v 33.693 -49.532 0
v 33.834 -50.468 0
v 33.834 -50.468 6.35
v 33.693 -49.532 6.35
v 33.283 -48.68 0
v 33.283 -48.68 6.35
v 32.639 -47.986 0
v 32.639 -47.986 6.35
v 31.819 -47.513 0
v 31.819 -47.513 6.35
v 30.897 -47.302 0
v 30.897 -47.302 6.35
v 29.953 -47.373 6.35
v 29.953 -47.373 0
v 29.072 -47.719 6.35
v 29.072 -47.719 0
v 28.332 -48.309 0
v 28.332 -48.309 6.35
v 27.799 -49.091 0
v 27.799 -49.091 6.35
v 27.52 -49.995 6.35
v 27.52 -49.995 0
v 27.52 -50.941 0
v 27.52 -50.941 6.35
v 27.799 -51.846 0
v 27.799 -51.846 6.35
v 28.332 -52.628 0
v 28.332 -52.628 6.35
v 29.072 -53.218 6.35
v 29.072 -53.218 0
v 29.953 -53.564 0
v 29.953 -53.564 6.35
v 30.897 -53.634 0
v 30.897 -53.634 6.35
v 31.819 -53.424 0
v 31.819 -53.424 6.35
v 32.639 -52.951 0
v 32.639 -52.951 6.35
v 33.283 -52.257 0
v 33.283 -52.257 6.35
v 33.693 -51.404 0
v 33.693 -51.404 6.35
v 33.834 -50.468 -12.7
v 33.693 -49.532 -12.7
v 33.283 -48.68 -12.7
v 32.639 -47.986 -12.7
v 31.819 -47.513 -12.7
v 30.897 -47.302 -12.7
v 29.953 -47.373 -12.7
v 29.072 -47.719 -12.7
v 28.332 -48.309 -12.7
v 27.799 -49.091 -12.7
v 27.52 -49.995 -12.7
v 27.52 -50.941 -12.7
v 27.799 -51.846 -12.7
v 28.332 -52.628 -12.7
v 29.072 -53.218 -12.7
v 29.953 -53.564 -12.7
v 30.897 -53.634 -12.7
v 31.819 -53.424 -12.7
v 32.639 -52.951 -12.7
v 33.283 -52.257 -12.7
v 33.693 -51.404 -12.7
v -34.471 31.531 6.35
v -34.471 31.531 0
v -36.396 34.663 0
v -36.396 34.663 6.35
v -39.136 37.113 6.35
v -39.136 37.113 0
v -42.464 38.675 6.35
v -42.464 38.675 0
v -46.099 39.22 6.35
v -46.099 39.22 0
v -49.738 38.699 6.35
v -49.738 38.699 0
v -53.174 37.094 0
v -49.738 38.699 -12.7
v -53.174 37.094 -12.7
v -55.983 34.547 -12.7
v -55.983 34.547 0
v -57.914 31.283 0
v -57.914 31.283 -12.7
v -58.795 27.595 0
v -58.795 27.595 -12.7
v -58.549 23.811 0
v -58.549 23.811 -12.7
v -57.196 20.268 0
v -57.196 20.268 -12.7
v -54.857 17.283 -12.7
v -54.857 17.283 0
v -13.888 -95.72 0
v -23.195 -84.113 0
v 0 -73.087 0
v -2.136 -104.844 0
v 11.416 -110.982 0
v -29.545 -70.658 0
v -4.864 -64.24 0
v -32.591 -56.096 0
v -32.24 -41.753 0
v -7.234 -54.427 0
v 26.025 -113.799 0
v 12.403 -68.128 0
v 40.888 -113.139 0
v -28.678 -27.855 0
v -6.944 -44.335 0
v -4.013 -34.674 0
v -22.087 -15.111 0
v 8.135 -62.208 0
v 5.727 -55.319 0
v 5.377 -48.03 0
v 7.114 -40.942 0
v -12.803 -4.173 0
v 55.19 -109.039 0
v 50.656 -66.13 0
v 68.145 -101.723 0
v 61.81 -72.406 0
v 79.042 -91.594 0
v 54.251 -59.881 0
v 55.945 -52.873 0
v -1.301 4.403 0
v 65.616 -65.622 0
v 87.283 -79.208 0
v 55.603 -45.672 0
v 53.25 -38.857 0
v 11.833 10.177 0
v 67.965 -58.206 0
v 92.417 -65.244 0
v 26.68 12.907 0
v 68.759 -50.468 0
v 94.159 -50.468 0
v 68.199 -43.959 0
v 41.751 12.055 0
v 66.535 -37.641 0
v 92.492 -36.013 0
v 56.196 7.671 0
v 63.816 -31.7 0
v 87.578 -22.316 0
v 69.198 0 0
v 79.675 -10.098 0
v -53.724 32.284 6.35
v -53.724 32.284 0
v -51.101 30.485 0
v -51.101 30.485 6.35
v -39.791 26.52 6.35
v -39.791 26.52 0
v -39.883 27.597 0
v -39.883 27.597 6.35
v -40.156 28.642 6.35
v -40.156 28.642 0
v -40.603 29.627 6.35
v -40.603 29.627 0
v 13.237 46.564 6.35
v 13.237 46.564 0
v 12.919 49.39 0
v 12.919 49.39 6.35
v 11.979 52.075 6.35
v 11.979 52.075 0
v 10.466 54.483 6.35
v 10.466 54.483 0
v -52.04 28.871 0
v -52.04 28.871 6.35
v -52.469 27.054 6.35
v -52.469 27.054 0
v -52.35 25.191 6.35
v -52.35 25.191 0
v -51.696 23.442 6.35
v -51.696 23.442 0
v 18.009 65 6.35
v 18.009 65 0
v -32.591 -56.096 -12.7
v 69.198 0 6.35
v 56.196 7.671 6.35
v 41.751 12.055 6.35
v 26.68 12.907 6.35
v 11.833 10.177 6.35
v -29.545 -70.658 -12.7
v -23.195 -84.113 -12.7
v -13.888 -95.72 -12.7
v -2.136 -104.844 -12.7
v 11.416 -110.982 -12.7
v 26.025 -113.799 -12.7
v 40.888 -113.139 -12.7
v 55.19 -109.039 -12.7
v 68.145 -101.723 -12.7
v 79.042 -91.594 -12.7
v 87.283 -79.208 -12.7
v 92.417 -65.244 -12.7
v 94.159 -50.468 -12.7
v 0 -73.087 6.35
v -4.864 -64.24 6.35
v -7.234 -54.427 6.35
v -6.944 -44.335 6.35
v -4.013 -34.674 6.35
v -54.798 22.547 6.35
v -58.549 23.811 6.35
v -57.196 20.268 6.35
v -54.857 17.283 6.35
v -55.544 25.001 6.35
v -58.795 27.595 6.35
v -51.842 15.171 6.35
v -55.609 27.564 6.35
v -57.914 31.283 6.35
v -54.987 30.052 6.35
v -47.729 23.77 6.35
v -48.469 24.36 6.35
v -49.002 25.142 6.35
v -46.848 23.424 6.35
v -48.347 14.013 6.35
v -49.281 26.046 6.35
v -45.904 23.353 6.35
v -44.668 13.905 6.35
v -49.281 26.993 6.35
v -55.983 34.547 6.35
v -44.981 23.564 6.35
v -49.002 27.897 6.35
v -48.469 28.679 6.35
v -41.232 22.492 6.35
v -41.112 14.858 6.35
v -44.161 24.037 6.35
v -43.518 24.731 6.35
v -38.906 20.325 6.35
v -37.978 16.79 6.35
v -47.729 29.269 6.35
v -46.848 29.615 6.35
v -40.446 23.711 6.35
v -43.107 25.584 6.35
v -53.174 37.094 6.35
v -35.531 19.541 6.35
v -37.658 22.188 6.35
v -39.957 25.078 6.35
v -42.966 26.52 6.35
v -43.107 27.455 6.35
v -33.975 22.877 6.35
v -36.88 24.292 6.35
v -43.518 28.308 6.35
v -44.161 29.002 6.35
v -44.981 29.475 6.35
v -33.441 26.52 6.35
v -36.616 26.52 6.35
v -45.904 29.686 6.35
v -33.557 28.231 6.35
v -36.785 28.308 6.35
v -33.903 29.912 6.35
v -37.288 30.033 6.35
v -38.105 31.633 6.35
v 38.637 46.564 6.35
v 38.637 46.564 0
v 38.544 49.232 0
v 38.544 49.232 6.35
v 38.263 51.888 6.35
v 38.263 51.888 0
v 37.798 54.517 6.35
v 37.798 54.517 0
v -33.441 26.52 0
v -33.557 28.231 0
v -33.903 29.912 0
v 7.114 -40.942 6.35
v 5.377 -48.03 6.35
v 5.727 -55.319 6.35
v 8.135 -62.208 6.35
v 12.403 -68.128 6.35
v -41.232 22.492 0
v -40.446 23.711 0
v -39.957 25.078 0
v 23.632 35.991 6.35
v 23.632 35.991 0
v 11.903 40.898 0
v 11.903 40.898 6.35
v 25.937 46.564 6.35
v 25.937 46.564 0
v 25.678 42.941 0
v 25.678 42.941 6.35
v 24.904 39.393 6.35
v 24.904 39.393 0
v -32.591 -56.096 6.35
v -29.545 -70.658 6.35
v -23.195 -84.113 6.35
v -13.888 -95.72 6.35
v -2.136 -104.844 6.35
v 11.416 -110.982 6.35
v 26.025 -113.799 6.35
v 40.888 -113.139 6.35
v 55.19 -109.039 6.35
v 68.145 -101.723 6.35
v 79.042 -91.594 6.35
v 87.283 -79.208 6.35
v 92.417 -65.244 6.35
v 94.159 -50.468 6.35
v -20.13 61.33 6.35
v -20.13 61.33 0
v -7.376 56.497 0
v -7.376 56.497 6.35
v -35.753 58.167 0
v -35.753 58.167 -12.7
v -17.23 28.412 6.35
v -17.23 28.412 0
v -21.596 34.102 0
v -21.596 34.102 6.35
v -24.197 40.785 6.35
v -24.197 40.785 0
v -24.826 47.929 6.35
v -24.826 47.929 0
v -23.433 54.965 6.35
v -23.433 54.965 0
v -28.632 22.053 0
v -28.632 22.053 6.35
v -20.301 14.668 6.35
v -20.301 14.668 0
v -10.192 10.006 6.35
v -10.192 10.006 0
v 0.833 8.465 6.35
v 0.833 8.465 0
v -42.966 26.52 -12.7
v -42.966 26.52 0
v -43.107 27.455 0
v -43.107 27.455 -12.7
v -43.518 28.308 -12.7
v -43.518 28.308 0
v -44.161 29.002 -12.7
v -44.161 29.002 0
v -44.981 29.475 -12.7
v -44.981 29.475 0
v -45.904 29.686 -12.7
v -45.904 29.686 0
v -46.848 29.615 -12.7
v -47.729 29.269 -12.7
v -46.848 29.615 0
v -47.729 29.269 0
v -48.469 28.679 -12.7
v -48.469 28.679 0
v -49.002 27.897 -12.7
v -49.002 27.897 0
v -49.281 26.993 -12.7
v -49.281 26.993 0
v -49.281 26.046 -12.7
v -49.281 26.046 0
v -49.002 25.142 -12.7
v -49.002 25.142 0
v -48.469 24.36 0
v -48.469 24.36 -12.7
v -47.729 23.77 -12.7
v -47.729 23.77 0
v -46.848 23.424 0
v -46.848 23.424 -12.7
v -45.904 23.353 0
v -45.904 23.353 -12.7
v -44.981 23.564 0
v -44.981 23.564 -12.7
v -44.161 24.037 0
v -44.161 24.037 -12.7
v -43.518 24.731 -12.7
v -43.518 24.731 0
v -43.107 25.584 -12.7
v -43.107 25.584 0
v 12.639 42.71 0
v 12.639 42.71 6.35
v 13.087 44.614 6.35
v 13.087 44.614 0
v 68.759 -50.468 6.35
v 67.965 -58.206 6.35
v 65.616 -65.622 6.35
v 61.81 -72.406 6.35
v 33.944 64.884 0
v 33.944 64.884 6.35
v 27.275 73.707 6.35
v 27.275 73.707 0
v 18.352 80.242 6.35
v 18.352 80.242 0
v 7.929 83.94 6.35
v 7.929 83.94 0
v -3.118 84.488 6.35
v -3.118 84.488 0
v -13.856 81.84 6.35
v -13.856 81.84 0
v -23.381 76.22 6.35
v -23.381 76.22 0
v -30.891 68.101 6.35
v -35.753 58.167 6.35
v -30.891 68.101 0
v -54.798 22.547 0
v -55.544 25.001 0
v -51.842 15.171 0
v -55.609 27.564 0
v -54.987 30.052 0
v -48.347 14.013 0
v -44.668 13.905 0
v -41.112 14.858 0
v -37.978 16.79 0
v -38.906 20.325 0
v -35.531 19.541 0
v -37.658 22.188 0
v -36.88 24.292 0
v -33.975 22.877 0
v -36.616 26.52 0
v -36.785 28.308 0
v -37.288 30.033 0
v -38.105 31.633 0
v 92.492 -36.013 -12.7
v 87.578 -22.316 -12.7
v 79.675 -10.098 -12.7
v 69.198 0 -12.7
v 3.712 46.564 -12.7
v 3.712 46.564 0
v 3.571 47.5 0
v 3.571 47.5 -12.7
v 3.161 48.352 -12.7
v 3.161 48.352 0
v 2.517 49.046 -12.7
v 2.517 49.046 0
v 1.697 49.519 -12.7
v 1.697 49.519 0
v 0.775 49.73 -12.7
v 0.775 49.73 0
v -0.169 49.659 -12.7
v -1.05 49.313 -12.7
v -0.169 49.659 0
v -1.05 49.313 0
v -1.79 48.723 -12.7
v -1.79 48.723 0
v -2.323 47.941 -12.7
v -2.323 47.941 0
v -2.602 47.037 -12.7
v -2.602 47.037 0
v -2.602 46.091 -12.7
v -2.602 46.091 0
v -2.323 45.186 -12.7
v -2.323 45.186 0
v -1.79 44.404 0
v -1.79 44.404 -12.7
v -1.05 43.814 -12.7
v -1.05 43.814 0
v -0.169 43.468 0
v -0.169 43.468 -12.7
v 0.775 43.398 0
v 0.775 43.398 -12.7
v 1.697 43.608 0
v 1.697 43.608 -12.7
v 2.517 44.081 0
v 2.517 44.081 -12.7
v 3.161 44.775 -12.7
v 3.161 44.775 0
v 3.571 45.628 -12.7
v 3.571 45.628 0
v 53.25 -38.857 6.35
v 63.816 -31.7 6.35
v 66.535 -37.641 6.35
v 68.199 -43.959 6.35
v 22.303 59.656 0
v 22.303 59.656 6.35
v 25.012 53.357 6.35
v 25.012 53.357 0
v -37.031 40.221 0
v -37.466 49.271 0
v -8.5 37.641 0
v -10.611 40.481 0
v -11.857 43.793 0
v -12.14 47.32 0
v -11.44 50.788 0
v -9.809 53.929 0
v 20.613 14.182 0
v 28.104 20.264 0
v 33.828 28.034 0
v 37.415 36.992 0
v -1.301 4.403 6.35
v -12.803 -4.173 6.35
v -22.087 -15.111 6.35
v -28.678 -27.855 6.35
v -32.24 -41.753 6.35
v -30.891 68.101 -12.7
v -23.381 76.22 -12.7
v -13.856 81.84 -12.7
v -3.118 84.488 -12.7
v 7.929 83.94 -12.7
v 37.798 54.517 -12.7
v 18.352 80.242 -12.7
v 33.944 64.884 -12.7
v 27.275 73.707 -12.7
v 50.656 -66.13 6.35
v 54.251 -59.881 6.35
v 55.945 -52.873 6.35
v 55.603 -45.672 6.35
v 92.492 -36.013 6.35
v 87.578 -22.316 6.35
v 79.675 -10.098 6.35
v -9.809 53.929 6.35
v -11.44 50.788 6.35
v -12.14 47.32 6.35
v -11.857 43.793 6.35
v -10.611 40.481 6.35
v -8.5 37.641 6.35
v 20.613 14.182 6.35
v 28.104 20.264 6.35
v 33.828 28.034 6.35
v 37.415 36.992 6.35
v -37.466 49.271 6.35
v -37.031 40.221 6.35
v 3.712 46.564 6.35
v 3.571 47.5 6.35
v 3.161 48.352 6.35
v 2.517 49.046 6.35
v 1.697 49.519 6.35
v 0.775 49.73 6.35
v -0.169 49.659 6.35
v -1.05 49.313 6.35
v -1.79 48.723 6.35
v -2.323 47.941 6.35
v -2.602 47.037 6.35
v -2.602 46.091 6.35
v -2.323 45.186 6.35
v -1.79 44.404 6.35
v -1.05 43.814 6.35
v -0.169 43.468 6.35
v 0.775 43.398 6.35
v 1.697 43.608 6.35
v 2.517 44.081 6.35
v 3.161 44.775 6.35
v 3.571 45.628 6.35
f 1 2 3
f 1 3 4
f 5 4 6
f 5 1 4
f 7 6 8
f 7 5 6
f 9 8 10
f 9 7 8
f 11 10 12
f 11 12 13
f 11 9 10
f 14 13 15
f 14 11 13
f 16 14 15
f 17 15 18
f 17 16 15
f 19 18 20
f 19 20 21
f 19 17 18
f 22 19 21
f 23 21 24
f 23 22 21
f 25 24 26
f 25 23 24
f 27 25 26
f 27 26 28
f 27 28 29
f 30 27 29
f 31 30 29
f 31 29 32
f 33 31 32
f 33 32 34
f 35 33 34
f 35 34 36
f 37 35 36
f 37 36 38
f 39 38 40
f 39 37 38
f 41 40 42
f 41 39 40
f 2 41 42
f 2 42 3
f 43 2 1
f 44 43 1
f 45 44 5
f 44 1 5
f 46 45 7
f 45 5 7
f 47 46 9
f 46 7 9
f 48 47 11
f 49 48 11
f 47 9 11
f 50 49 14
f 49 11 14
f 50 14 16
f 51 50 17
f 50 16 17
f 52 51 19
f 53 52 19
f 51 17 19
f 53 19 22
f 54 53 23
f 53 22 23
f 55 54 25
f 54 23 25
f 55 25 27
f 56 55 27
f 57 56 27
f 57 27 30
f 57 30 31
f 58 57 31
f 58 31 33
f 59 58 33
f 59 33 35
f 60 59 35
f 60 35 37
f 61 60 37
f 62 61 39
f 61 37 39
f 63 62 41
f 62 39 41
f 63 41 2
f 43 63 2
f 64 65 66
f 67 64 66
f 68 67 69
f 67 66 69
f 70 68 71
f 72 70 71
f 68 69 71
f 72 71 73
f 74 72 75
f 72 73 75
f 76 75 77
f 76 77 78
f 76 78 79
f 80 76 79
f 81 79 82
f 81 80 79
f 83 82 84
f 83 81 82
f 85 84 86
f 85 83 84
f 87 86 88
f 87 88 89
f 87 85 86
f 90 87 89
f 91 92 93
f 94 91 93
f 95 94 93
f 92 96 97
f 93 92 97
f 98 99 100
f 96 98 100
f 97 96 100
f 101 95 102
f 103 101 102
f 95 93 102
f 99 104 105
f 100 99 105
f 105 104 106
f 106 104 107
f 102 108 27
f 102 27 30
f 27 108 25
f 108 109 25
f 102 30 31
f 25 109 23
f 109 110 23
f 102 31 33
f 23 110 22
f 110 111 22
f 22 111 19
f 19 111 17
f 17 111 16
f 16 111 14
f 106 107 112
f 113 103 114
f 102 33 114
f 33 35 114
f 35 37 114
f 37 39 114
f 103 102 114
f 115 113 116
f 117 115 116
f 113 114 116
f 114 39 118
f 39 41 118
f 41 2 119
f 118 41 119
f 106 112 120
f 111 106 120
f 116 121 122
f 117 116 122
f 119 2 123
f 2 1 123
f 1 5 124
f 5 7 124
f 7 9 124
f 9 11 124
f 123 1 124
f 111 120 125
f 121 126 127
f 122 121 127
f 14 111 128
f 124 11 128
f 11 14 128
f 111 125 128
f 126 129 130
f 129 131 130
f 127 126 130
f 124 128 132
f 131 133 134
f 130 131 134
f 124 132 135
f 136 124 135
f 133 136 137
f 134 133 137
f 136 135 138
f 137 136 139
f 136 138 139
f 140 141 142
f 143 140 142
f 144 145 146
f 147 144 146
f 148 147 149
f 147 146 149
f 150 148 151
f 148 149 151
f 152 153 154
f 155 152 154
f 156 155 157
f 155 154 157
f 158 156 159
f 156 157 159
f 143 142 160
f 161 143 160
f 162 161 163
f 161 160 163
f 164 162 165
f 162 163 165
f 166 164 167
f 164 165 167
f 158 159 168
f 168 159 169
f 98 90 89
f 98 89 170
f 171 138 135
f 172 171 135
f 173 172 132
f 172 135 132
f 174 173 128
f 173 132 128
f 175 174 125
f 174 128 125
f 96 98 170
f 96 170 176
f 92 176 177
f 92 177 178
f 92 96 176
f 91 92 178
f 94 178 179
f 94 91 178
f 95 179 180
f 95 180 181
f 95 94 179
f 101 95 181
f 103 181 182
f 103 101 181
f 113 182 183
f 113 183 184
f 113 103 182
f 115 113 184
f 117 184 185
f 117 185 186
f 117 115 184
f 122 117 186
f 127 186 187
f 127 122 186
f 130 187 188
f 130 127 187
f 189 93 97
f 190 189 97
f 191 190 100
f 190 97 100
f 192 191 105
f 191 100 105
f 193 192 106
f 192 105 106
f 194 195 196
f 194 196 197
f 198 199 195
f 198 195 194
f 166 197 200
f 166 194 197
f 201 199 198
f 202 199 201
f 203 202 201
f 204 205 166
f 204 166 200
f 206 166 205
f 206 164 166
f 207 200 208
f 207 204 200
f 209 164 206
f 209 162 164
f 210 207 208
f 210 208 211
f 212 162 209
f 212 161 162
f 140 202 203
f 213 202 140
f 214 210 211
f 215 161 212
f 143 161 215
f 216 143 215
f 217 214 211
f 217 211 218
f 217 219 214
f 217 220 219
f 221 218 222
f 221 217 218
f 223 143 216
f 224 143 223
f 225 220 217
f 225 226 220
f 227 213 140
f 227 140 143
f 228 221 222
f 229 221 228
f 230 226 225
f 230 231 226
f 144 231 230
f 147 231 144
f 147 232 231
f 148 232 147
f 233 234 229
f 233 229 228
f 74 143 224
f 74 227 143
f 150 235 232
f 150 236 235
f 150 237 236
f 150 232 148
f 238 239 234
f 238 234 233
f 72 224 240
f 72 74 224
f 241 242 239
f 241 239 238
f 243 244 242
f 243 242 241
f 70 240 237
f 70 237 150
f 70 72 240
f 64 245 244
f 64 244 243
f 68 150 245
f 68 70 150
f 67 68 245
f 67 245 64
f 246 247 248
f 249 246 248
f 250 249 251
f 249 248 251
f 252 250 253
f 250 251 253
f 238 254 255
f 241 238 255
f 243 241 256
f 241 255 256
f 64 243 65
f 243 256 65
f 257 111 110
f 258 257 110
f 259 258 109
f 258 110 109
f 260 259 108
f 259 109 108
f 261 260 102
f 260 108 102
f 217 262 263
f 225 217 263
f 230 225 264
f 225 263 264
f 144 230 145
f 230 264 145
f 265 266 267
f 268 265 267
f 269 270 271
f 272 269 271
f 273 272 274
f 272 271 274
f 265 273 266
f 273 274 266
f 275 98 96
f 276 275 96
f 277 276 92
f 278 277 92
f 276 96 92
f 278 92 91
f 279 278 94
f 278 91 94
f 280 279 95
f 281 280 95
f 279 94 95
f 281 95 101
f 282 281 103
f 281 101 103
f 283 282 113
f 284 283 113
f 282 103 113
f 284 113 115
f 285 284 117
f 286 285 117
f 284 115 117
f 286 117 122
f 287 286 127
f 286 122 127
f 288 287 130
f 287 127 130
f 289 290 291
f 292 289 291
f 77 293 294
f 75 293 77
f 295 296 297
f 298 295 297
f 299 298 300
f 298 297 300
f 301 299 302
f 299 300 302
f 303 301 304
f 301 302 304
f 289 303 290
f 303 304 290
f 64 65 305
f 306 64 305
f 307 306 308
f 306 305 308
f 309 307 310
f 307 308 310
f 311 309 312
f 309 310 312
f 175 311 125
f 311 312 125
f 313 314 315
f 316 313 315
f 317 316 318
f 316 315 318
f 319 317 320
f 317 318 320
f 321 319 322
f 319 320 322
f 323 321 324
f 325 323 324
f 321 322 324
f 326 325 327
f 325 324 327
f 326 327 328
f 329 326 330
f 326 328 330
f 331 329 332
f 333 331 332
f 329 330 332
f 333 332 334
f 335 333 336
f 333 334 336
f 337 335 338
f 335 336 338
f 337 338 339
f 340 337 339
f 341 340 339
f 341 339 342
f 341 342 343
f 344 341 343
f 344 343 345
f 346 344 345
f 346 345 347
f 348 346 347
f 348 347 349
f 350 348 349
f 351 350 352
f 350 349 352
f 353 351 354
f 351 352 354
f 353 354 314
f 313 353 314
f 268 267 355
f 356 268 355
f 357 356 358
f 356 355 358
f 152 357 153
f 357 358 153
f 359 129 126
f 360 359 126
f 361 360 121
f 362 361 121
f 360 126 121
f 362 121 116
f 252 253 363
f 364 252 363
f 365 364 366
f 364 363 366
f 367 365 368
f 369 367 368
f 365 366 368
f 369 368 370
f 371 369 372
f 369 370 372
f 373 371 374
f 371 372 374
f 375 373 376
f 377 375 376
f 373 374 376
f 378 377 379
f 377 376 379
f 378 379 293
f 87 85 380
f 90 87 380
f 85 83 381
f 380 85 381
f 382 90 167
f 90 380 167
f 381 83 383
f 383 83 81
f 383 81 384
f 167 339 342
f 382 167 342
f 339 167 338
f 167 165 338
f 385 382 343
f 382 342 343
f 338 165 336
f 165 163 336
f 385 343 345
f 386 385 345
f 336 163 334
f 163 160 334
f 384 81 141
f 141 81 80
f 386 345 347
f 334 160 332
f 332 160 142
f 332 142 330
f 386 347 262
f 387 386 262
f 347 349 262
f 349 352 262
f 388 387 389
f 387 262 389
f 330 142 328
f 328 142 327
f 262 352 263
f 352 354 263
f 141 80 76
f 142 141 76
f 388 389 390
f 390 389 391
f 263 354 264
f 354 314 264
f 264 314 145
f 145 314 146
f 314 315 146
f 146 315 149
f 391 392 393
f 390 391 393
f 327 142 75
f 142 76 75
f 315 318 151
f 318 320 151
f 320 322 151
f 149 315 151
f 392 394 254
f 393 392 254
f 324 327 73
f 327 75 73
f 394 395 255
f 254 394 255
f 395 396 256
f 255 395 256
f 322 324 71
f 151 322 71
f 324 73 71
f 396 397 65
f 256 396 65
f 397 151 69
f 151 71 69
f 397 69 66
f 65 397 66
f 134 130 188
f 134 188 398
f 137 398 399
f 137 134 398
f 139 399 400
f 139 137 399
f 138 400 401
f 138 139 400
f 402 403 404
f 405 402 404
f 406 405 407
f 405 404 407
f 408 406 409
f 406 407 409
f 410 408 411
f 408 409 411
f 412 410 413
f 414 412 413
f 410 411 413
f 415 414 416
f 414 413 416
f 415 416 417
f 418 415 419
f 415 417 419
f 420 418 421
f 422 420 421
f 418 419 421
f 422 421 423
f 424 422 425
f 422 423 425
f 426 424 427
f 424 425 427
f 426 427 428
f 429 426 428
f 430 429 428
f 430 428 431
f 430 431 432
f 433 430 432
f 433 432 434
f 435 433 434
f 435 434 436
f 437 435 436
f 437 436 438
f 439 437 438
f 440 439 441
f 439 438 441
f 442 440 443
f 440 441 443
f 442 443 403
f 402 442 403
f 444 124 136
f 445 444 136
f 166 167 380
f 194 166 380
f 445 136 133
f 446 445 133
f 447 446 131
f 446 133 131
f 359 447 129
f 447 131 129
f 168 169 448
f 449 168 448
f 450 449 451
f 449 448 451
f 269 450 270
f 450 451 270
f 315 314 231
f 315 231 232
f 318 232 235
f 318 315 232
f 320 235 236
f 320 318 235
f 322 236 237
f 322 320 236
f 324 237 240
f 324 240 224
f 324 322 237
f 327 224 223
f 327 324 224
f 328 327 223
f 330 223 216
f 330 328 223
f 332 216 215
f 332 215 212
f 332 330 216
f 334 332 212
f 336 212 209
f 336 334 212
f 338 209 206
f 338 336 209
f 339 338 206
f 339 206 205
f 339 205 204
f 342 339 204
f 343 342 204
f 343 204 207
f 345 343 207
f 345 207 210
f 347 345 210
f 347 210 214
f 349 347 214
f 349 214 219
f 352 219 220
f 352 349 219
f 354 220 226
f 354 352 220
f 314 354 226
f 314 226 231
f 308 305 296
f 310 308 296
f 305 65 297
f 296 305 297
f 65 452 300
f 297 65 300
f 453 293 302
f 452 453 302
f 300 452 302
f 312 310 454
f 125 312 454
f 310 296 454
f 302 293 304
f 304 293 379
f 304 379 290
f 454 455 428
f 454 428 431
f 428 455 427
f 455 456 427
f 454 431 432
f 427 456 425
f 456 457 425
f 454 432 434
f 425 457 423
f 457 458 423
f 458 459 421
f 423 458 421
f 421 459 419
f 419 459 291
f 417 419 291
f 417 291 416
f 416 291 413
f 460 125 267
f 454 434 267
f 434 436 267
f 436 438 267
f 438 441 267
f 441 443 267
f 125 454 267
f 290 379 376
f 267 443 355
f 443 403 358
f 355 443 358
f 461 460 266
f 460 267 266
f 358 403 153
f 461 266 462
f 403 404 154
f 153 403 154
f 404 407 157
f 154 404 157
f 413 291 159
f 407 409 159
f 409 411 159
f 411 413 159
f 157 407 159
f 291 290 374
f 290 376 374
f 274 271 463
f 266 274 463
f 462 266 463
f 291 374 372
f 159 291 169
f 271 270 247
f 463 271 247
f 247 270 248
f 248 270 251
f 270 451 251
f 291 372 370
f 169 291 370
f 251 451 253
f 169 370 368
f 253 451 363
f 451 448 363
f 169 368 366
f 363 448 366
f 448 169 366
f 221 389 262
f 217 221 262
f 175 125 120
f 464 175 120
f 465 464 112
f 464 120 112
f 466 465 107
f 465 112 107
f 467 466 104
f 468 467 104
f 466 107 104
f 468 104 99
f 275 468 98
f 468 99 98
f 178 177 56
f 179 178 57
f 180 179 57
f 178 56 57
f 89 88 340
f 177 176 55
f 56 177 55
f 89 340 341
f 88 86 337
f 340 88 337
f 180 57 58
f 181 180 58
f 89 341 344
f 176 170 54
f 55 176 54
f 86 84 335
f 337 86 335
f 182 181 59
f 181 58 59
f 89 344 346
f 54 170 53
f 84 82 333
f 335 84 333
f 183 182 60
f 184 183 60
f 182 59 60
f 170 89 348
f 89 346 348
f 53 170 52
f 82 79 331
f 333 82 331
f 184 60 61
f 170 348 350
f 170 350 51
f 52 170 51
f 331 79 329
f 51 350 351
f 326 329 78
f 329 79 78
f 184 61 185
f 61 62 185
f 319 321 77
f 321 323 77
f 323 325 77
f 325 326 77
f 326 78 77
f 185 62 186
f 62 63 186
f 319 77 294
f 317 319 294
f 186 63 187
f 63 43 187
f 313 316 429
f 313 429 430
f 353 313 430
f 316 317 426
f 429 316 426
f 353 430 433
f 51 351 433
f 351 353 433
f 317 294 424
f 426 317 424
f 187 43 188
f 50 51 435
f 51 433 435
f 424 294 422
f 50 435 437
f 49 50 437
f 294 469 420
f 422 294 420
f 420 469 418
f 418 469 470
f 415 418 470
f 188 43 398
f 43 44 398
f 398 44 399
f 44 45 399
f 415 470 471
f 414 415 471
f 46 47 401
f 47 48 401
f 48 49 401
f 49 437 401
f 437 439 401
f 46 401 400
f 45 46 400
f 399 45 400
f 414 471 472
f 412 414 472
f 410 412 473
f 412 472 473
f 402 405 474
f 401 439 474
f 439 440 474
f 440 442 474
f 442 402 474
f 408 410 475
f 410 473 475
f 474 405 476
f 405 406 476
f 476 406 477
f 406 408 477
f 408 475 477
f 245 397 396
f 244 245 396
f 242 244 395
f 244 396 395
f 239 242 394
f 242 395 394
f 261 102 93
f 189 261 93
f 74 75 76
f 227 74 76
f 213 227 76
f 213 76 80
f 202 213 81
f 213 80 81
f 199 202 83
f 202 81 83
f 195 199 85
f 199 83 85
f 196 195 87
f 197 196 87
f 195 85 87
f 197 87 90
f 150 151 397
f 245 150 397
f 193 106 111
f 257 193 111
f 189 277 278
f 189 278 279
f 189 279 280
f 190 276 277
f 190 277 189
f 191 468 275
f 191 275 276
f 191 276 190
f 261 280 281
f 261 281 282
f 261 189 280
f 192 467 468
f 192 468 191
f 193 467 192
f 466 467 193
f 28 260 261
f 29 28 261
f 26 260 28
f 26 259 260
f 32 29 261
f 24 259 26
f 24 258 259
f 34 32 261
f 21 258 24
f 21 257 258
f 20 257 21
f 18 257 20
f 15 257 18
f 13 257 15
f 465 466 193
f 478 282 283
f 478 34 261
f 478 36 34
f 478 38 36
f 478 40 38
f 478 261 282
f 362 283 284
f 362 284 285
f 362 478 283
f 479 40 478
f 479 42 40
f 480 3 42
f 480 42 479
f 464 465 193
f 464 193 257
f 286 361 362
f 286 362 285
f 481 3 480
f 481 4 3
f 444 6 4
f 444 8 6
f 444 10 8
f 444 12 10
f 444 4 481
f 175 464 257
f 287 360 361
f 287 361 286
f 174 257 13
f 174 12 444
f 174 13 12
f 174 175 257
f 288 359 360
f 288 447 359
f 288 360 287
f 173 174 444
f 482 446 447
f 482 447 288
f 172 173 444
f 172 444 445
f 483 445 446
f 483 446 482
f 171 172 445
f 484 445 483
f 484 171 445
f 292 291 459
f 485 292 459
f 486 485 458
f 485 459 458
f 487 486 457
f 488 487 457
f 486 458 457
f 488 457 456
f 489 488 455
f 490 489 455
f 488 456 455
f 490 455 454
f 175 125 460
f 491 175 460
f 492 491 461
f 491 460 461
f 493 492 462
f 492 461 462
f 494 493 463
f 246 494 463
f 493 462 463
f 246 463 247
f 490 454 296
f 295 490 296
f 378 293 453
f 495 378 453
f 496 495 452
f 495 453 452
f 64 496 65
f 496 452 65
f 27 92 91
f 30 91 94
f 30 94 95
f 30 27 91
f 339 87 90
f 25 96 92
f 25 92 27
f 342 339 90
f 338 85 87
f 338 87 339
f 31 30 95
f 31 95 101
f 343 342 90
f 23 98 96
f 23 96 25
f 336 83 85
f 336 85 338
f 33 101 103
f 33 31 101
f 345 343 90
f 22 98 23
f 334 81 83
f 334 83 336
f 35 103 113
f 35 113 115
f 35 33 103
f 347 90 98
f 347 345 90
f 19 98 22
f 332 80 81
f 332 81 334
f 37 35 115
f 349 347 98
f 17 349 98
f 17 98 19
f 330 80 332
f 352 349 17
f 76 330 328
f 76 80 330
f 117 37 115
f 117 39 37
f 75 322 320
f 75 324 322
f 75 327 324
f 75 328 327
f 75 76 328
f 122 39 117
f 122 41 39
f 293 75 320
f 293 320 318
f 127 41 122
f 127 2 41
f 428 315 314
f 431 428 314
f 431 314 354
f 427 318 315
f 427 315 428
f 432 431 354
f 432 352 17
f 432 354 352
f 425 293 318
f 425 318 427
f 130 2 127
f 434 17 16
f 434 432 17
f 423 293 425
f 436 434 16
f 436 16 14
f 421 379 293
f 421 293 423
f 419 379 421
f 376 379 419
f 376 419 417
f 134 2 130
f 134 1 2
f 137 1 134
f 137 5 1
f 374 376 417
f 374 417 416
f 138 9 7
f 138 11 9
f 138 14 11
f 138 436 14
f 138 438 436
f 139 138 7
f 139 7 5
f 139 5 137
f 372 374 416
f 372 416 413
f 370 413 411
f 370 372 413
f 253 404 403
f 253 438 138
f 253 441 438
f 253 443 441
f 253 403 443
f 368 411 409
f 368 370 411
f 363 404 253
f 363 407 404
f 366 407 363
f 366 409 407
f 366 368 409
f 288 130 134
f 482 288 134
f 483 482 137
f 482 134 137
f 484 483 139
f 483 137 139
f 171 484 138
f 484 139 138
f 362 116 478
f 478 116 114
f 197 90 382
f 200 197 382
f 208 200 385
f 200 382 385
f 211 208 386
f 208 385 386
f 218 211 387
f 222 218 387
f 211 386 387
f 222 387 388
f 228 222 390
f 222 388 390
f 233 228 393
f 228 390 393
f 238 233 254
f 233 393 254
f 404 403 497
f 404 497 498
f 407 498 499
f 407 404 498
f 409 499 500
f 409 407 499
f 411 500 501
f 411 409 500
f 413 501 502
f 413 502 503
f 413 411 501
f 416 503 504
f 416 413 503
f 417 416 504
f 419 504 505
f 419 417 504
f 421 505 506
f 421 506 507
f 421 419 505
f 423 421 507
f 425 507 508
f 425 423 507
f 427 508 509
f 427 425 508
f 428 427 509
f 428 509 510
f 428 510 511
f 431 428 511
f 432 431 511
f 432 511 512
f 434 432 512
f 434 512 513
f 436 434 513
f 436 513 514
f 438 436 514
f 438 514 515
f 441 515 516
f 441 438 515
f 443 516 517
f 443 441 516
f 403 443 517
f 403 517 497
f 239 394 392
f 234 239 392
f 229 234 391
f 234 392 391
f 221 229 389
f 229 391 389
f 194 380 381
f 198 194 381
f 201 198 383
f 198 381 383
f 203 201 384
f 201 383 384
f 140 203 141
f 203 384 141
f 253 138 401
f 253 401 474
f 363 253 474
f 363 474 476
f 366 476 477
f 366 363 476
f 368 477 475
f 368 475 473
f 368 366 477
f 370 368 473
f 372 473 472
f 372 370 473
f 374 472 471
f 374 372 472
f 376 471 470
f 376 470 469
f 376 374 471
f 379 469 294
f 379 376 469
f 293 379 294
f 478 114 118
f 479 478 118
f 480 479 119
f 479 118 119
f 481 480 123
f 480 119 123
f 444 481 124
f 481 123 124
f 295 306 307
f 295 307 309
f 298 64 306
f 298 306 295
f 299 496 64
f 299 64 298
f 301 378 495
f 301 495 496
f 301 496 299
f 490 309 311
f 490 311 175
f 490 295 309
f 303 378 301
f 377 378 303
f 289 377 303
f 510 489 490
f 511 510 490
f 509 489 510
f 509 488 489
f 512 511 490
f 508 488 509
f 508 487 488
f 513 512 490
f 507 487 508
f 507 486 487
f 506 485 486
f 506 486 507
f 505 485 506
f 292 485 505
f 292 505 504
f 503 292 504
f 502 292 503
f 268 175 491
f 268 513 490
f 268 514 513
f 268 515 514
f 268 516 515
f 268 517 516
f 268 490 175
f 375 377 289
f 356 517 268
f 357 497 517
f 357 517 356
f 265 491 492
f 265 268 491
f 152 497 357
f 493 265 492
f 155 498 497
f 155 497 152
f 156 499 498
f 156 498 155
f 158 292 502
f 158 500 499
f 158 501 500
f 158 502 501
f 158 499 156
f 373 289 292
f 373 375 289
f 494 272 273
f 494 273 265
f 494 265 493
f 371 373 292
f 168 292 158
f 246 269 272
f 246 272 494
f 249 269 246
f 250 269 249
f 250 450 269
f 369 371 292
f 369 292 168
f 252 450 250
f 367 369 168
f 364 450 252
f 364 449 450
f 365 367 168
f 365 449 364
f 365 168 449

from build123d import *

# Parameters (mm, degrees)
F0_R     = 3.175
F1_DEPTH = 6.35
F2_DEPTH = 12.7


with BuildPart() as f1:
    # F0 (on Top) → F1 (new body)
    with BuildSketch(Plane.XY):
        with BuildLine():
            ThreePointArc((-35.7529609464, 58.1667364851), (-37.5186970008, 44.7329056435), (-34.4714793594, 31.5306293419))
            ThreePointArc((-34.4714793594, 31.5306293419), (-15.4180520019, 11.9655799049), (11.8330852799, 10.1767897043))
            ThreePointArc((11.8330852799, 10.1767897043), (31.2128455927, 23.9669025865), (38.6372855282, 46.5638053551))
            ThreePointArc((38.6372855282, 46.5638053551), (38.4268711154, 50.5624681355), (37.7979519832, 54.5169641821))
            ThreePointArc((37.7979519832, 54.5169641821), (2.4255752837, 84.6169834326), (-35.7529609464, 58.1667364851))
        make_face()
        with BuildLine():
            ThreePointArc((-20.1295190644, 61.3300908707), (-1.8957653213, 71.8470065678), (18.0089300704, 65.0002268351))
            ThreePointArc((18.0089300704, 65.0002268351), (23.8711640247, 56.5982517431), (25.9372855282, 46.5638053551))
            ThreePointArc((25.9372855282, 46.5638053551), (25.3543094725, 41.1531378778), (23.6321420204, 35.9908396591))
            ThreePointArc((23.6321420204, 35.9908396591), (5.1693034125, 21.589730591), (-17.2299057254, 28.4120309251))
            ThreePointArc((-17.2299057254, 28.4120309251), (-24.7647435766, 44.3350561147), (-20.1295190644, 61.3300908707))
        make_face(mode=Mode.SUBTRACT)
        with BuildLine():
            ThreePointArc((11.903429337, 40.8980507788), (12.8993247284, 43.6534811782), (13.2372855282, 46.5638053551))
            ThreePointArc((13.2372855282, 46.5638053551), (12.5244421894, 50.7588113362), (10.4659351059, 54.482891007))
            ThreePointArc((10.4659351059, 54.482891007), (1.962138395, 59.1836228778), (-7.3756989197, 56.4973181842))
            ThreePointArc((-7.3756989197, 56.4973181842), (-12.1401878613, 47.3198929538), (-8.5002807579, 37.6412274976))
            ThreePointArc((-8.5002807579, 37.6412274976), (2.5391078957, 34.022565097), (11.903429337, 40.8980507788))
        make_face()
        with Locations((0.5372855282, 46.5638053551)):
            Circle(F0_R, mode=Mode.SUBTRACT)
        with BuildLine():
            Line((23.6321420204, 35.9908396591), (11.903429337, 40.8980507788))
            ThreePointArc((11.903429337, 40.8980507788), (2.5391078957, 34.022565097), (-8.5002807579, 37.6412274976))
            Line((-8.5002807579, 37.6412274976), (-17.2299057254, 28.4120309251))
            ThreePointArc((-17.2299057254, 28.4120309251), (5.1693034125, 21.589730591), (23.6321420204, 35.9908396591))
        make_face()
        with BuildLine():
            ThreePointArc((-7.3756989197, 56.4973181842), (1.962138395, 59.1836228778), (10.4659351059, 54.482891007))
            Line((10.4659351059, 54.482891007), (18.0089300704, 65.0002268351))
            ThreePointArc((18.0089300704, 65.0002268351), (-1.8957653213, 71.8470065678), (-20.1295190644, 61.3300908707))
            Line((-20.1295190644, 61.3300908707), (-7.3756989197, 56.4973181842))
        make_face()
    extrude(amount=F1_DEPTH)


with BuildPart() as f1b:
    # F0 (on Top) → F1, piece 2 (new body)
    with BuildSketch(Plane.XY):
        with BuildLine():
            ThreePointArc((11.8330852799, 10.1767897043), (-22.0866208351, -15.1114071818), (-32.5907435662, -56.0955842544))
            ThreePointArc((-32.5907435662, -56.0955842544), (33.4758637329, -113.9057460769), (94.1594181419, -50.4682363982))
            ThreePointArc((94.1594181419, -50.4682363982), (87.5779451985, -22.3163043559), (69.1978030958, 0))
            ThreePointArc((69.1978030958, 0), (41.7514428259, 12.0554950037), (11.8330852799, 10.1767897043))
        make_face()
        with BuildLine():
            ThreePointArc((-4.0126707213, -34.6740522198), (28.9907510806, -12.4047952737), (63.8163429852, -31.700489199))
            ThreePointArc((63.8163429852, -31.700489199), (67.5029307088, -40.7643412146), (68.7594181419, -50.4682363982))
            ThreePointArc((68.7594181419, -50.4682363982), (66.9804977497, -61.9742859429), (61.8098550907, -72.4058816206))
            ThreePointArc((61.8098550907, -72.4058816206), (31.0792604542, -88.5659231053), (0, -73.0870356413))
            ThreePointArc((0, -73.0870356413), (-7.2343910586, -54.4266734982), (-4.0126707213, -34.6740522198))
        make_face(mode=Mode.SUBTRACT)
        with BuildLine():
            ThreePointArc((7.1136108793, -40.9416966092), (29.5130488205, -25.0941189282), (53.2502621228, -38.8573032647))
            Line((53.2502621228, -38.8573032647), (63.8163429852, -31.700489199))
            ThreePointArc((63.8163429852, -31.700489199), (28.9907510806, -12.4047952737), (-4.0126707213, -34.6740522198))
            Line((-4.0126707213, -34.6740522198), (7.1136108793, -40.9416966092))
        make_face()
        with BuildLine():
            ThreePointArc((50.6561773891, -66.1299610673), (54.6706414019, -58.7520252391), (56.0594181419, -50.4682363982))
            ThreePointArc((56.0594181419, -50.4682363982), (55.3471421876, -44.4952738634), (53.2502621228, -38.8573032647))
            ThreePointArc((53.2502621228, -38.8573032647), (29.5130488205, -25.0941189282), (7.1136108793, -40.9416966092))
            ThreePointArc((7.1136108793, -40.9416966092), (5.7269074554, -55.3190003449), (12.402800821, -68.1276793112))
            ThreePointArc((12.402800821, -68.1276793112), (31.9840852799, -75.8336706932), (50.6561773891, -66.1299610673))
        make_face()
        with Locations((30.6594181419, -50.4682363982)):
            Circle(F0_R, mode=Mode.SUBTRACT)
        with BuildLine():
            Line((61.8098550907, -72.4058816206), (50.6561773891, -66.1299610673))
            ThreePointArc((50.6561773891, -66.1299610673), (31.9840852799, -75.8336706932), (12.402800821, -68.1276793112))
            Line((12.402800821, -68.1276793112), (0, -73.0870356413))
            ThreePointArc((0, -73.0870356413), (31.0792604542, -88.5659231053), (61.8098550907, -72.4058816206))
        make_face()
    extrude(amount=F1_DEPTH)


with BuildPart() as f1c:
    # F0 (on Top) → F1, piece 3 (new body)
    with BuildSketch(Plane.XY):
        with BuildLine():
            ThreePointArc((-34.4714793594, 31.5306293419), (-40.7430017129, 38.0152615062), (-49.7382382473, 38.6994885348))
            ThreePointArc((-49.7382382473, 38.6994885348), (-58.4931063906, 29.4720544391), (-54.8573955894, 17.2829255462))
            ThreePointArc((-54.8573955894, 17.2829255462), (-41.1115233854, 14.8579391921), (-33.4410682097, 26.519571962))
            ThreePointArc((-33.4410682097, 26.519571962), (-33.7013379393, 29.0775224698), (-34.4714793594, 31.5306293419))
        make_face()
        with BuildLine():
            ThreePointArc((-53.7238418013, 32.2838732777), (-45.7443444611, 36.0363064475), (-38.104844935, 31.6327647492))
            ThreePointArc((-38.104844935, 31.6327647492), (-36.9958330654, 29.1823335274), (-36.6160682097, 26.519571962))
            ThreePointArc((-36.6160682097, 26.519571962), (-37.2068059127, 23.2173632758), (-38.9057442638, 20.3247586155))
            ThreePointArc((-38.9057442638, 20.3247586155), (-47.460328308, 17.086376438), (-54.7982782434, 22.5473761672))
            ThreePointArc((-54.7982782434, 22.5473761672), (-55.608597509, 27.5643274198), (-53.7238418013, 32.2838732777))
        make_face(mode=Mode.SUBTRACT)
        with BuildLine():
            ThreePointArc((-41.2321439004, 22.4915498512), (-40.1621816343, 24.3805499149), (-39.7910682097, 26.519571962))
            ThreePointArc((-39.7910682097, 26.519571962), (-39.9974305359, 28.1252544127), (-40.6031047869, 29.6265739136))
            ThreePointArc((-40.6031047869, 29.6265739136), (-45.623771042, 32.8484663078), (-51.100991484, 30.484626957))
            ThreePointArc((-51.100991484, 30.484626957), (-52.4685502322, 27.0538670627), (-51.6956428568, 23.4423653569))
            ThreePointArc((-51.6956428568, 23.4423653569), (-46.7157234291, 20.1956276723), (-41.2321439004, 22.4915498512))
        make_face()
        with Locations((-46.1410682097, 26.519571962)):
            Circle(F0_R, mode=Mode.SUBTRACT)
        with BuildLine():
            Line((-38.9057442638, 20.3247586155), (-41.2321439004, 22.4915498512))
            ThreePointArc((-41.2321439004, 22.4915498512), (-46.7157234291, 20.1956276723), (-51.6956428568, 23.4423653569))
            Line((-51.6956428568, 23.4423653569), (-54.7982782434, 22.5473761672))
            ThreePointArc((-54.7982782434, 22.5473761672), (-47.460328308, 17.086376438), (-38.9057442638, 20.3247586155))
        make_face()
        with BuildLine():
            ThreePointArc((-51.100991484, 30.484626957), (-45.623771042, 32.8484663078), (-40.6031047869, 29.6265739136))
            Line((-40.6031047869, 29.6265739136), (-38.104844935, 31.6327647492))
            ThreePointArc((-38.104844935, 31.6327647492), (-45.7443444611, 36.0363064475), (-53.7238418013, 32.2838732777))
            Line((-53.7238418013, 32.2838732777), (-51.100991484, 30.484626957))
        make_face()
    extrude(amount=F1_DEPTH)


with BuildPart() as f2:
    # F0 (on Top) → F2 (new body)
    with BuildSketch(Plane.XY):
        with BuildLine():
            ThreePointArc((-34.4714793594, 31.5306293419), (-40.7430017129, 38.0152615062), (-49.7382382473, 38.6994885348))
            ThreePointArc((-49.7382382473, 38.6994885348), (-58.4931063906, 29.4720544391), (-54.8573955894, 17.2829255462))
            ThreePointArc((-54.8573955894, 17.2829255462), (-41.1115233854, 14.8579391921), (-33.4410682097, 26.519571962))
            ThreePointArc((-33.4410682097, 26.519571962), (-33.7013379393, 29.0775224698), (-34.4714793594, 31.5306293419))
        make_face()
        with BuildLine():
            ThreePointArc((-53.7238418013, 32.2838732777), (-45.7443444611, 36.0363064475), (-38.104844935, 31.6327647492))
            ThreePointArc((-38.104844935, 31.6327647492), (-36.9958330654, 29.1823335274), (-36.6160682097, 26.519571962))
            ThreePointArc((-36.6160682097, 26.519571962), (-37.2068059127, 23.2173632758), (-38.9057442638, 20.3247586155))
            ThreePointArc((-38.9057442638, 20.3247586155), (-47.460328308, 17.086376438), (-54.7982782434, 22.5473761672))
            ThreePointArc((-54.7982782434, 22.5473761672), (-55.608597509, 27.5643274198), (-53.7238418013, 32.2838732777))
        make_face(mode=Mode.SUBTRACT)
        with BuildLine():
            Line((-35.7529609464, 58.1667364851), (-49.7382382473, 38.6994885348))
            ThreePointArc((-49.7382382473, 38.6994885348), (-40.7430017129, 38.0152615062), (-34.4714793594, 31.5306293419))
            ThreePointArc((-34.4714793594, 31.5306293419), (-37.5186970008, 44.7329056435), (-35.7529609464, 58.1667364851))
        make_face()
        with BuildLine():
            ThreePointArc((-33.4410682097, 26.519571962), (-41.1115233854, 14.8579391921), (-54.8573955894, 17.2829255462))
            Line((-54.8573955894, 17.2829255462), (-32.5907435662, -56.0955842544))
            ThreePointArc((-32.5907435662, -56.0955842544), (-22.0866208351, -15.1114071818), (11.8330852799, 10.1767897043))
            ThreePointArc((11.8330852799, 10.1767897043), (-15.4180520019, 11.9655799049), (-34.4714793594, 31.5306293419))
            ThreePointArc((-34.4714793594, 31.5306293419), (-33.7013379393, 29.0775224698), (-33.4410682097, 26.519571962))
        make_face()
        with BuildLine():
            ThreePointArc((-35.7529609464, 58.1667364851), (-37.5186970008, 44.7329056435), (-34.4714793594, 31.5306293419))
            ThreePointArc((-34.4714793594, 31.5306293419), (-15.4180520019, 11.9655799049), (11.8330852799, 10.1767897043))
            ThreePointArc((11.8330852799, 10.1767897043), (31.2128455927, 23.9669025865), (38.6372855282, 46.5638053551))
            ThreePointArc((38.6372855282, 46.5638053551), (38.4268711154, 50.5624681355), (37.7979519832, 54.5169641821))
            ThreePointArc((37.7979519832, 54.5169641821), (2.4255752837, 84.6169834326), (-35.7529609464, 58.1667364851))
        make_face()
        with BuildLine():
            ThreePointArc((-20.1295190644, 61.3300908707), (-1.8957653213, 71.8470065678), (18.0089300704, 65.0002268351))
            ThreePointArc((18.0089300704, 65.0002268351), (23.8711640247, 56.5982517431), (25.9372855282, 46.5638053551))
            ThreePointArc((25.9372855282, 46.5638053551), (25.3543094725, 41.1531378778), (23.6321420204, 35.9908396591))
            ThreePointArc((23.6321420204, 35.9908396591), (5.1693034125, 21.589730591), (-17.2299057254, 28.4120309251))
            ThreePointArc((-17.2299057254, 28.4120309251), (-24.7647435766, 44.3350561147), (-20.1295190644, 61.3300908707))
        make_face(mode=Mode.SUBTRACT)
        with BuildLine():
            ThreePointArc((11.8330852799, 10.1767897043), (-22.0866208351, -15.1114071818), (-32.5907435662, -56.0955842544))
            ThreePointArc((-32.5907435662, -56.0955842544), (33.4758637329, -113.9057460769), (94.1594181419, -50.4682363982))
            ThreePointArc((94.1594181419, -50.4682363982), (87.5779451985, -22.3163043559), (69.1978030958, 0))
            ThreePointArc((69.1978030958, 0), (41.7514428259, 12.0554950037), (11.8330852799, 10.1767897043))
        make_face()
        with BuildLine():
            ThreePointArc((-4.0126707213, -34.6740522198), (28.9907510806, -12.4047952737), (63.8163429852, -31.700489199))
            ThreePointArc((63.8163429852, -31.700489199), (67.5029307088, -40.7643412146), (68.7594181419, -50.4682363982))
            ThreePointArc((68.7594181419, -50.4682363982), (66.9804977497, -61.9742859429), (61.8098550907, -72.4058816206))
            ThreePointArc((61.8098550907, -72.4058816206), (31.0792604542, -88.5659231053), (0, -73.0870356413))
            ThreePointArc((0, -73.0870356413), (-7.2343910586, -54.4266734982), (-4.0126707213, -34.6740522198))
        make_face(mode=Mode.SUBTRACT)
        with BuildLine():
            ThreePointArc((38.6372855282, 46.5638053551), (31.2128455927, 23.9669025865), (11.8330852799, 10.1767897043))
            ThreePointArc((11.8330852799, 10.1767897043), (41.7514428259, 12.0554950037), (69.1978030958, 0))
            Line((69.1978030958, 0), (37.7979519832, 54.5169641821))
            ThreePointArc((37.7979519832, 54.5169641821), (38.4268711154, 50.5624681355), (38.6372855282, 46.5638053551))
        make_face()
        with BuildLine():
            Line((61.8098550907, -72.4058816206), (50.6561773891, -66.1299610673))
            ThreePointArc((50.6561773891, -66.1299610673), (31.9840852799, -75.8336706932), (12.402800821, -68.1276793112))
            Line((12.402800821, -68.1276793112), (0, -73.0870356413))
            ThreePointArc((0, -73.0870356413), (31.0792604542, -88.5659231053), (61.8098550907, -72.4058816206))
        make_face()
        with BuildLine():
            ThreePointArc((50.6561773891, -66.1299610673), (54.6706414019, -58.7520252391), (56.0594181419, -50.4682363982))
            ThreePointArc((56.0594181419, -50.4682363982), (55.3471421876, -44.4952738634), (53.2502621228, -38.8573032647))
            ThreePointArc((53.2502621228, -38.8573032647), (29.5130488205, -25.0941189282), (7.1136108793, -40.9416966092))
            ThreePointArc((7.1136108793, -40.9416966092), (5.7269074554, -55.3190003449), (12.402800821, -68.1276793112))
            ThreePointArc((12.402800821, -68.1276793112), (31.9840852799, -75.8336706932), (50.6561773891, -66.1299610673))
        make_face()
        with Locations((30.6594181419, -50.4682363982)):
            Circle(F0_R, mode=Mode.SUBTRACT)
        with BuildLine():
            ThreePointArc((7.1136108793, -40.9416966092), (29.5130488205, -25.0941189282), (53.2502621228, -38.8573032647))
            Line((53.2502621228, -38.8573032647), (63.8163429852, -31.700489199))
            ThreePointArc((63.8163429852, -31.700489199), (28.9907510806, -12.4047952737), (-4.0126707213, -34.6740522198))
            Line((-4.0126707213, -34.6740522198), (7.1136108793, -40.9416966092))
        make_face()
        with BuildLine():
            ThreePointArc((53.2502621228, -38.8573032647), (55.3471421876, -44.4952738634), (56.0594181419, -50.4682363982))
            ThreePointArc((56.0594181419, -50.4682363982), (54.6706414019, -58.7520252391), (50.6561773891, -66.1299610673))
            Line((50.6561773891, -66.1299610673), (61.8098550907, -72.4058816206))
            ThreePointArc((61.8098550907, -72.4058816206), (66.9804977497, -61.9742859429), (68.7594181419, -50.4682363982))
            ThreePointArc((68.7594181419, -50.4682363982), (67.5029307088, -40.7643412146), (63.8163429852, -31.700489199))
            Line((63.8163429852, -31.700489199), (53.2502621228, -38.8573032647))
        make_face()
        with BuildLine():
            ThreePointArc((12.402800821, -68.1276793112), (5.7269074554, -55.3190003449), (7.1136108793, -40.9416966092))
            Line((7.1136108793, -40.9416966092), (-4.0126707213, -34.6740522198))
            ThreePointArc((-4.0126707213, -34.6740522198), (-7.2343910586, -54.4266734982), (0, -73.0870356413))
            Line((0, -73.0870356413), (12.402800821, -68.1276793112))
        make_face()
        with BuildLine():
            Line((23.6321420204, 35.9908396591), (11.903429337, 40.8980507788))
            ThreePointArc((11.903429337, 40.8980507788), (2.5391078957, 34.022565097), (-8.5002807579, 37.6412274976))
            Line((-8.5002807579, 37.6412274976), (-17.2299057254, 28.4120309251))
            ThreePointArc((-17.2299057254, 28.4120309251), (5.1693034125, 21.589730591), (23.6321420204, 35.9908396591))
        make_face()
        with BuildLine():
            ThreePointArc((11.903429337, 40.8980507788), (12.8993247284, 43.6534811782), (13.2372855282, 46.5638053551))
            ThreePointArc((13.2372855282, 46.5638053551), (12.5244421894, 50.7588113362), (10.4659351059, 54.482891007))
            ThreePointArc((10.4659351059, 54.482891007), (1.962138395, 59.1836228778), (-7.3756989197, 56.4973181842))
            ThreePointArc((-7.3756989197, 56.4973181842), (-12.1401878613, 47.3198929538), (-8.5002807579, 37.6412274976))
            ThreePointArc((-8.5002807579, 37.6412274976), (2.5391078957, 34.022565097), (11.903429337, 40.8980507788))
        make_face()
        with Locations((0.5372855282, 46.5638053551)):
            Circle(F0_R, mode=Mode.SUBTRACT)
        with BuildLine():
            ThreePointArc((-7.3756989197, 56.4973181842), (1.962138395, 59.1836228778), (10.4659351059, 54.482891007))
            Line((10.4659351059, 54.482891007), (18.0089300704, 65.0002268351))
            ThreePointArc((18.0089300704, 65.0002268351), (-1.8957653213, 71.8470065678), (-20.1295190644, 61.3300908707))
            Line((-20.1295190644, 61.3300908707), (-7.3756989197, 56.4973181842))
        make_face()
        with BuildLine():
            ThreePointArc((10.4659351059, 54.482891007), (12.5244421894, 50.7588113362), (13.2372855282, 46.5638053551))
            ThreePointArc((13.2372855282, 46.5638053551), (12.8993247284, 43.6534811782), (11.903429337, 40.8980507788))
            Line((11.903429337, 40.8980507788), (23.6321420204, 35.9908396591))
            ThreePointArc((23.6321420204, 35.9908396591), (25.3543094725, 41.1531378778), (25.9372855282, 46.5638053551))
            ThreePointArc((25.9372855282, 46.5638053551), (23.8711640247, 56.5982517431), (18.0089300704, 65.0002268351))
            Line((18.0089300704, 65.0002268351), (10.4659351059, 54.482891007))
        make_face()
        with BuildLine():
            ThreePointArc((-8.5002807579, 37.6412274976), (-12.1401878613, 47.3198929538), (-7.3756989197, 56.4973181842))
            Line((-7.3756989197, 56.4973181842), (-20.1295190644, 61.3300908707))
            ThreePointArc((-20.1295190644, 61.3300908707), (-24.7647435766, 44.3350561147), (-17.2299057254, 28.4120309251))
            Line((-17.2299057254, 28.4120309251), (-8.5002807579, 37.6412274976))
        make_face()
        with BuildLine():
            ThreePointArc((-51.100991484, 30.484626957), (-45.623771042, 32.8484663078), (-40.6031047869, 29.6265739136))
            Line((-40.6031047869, 29.6265739136), (-38.104844935, 31.6327647492))
            ThreePointArc((-38.104844935, 31.6327647492), (-45.7443444611, 36.0363064475), (-53.7238418013, 32.2838732777))
            Line((-53.7238418013, 32.2838732777), (-51.100991484, 30.484626957))
        make_face()
        with BuildLine():
            ThreePointArc((-40.6031047869, 29.6265739136), (-39.9974305359, 28.1252544127), (-39.7910682097, 26.519571962))
            ThreePointArc((-39.7910682097, 26.519571962), (-40.1621816343, 24.3805499149), (-41.2321439004, 22.4915498512))
            Line((-41.2321439004, 22.4915498512), (-38.9057442638, 20.3247586155))
            ThreePointArc((-38.9057442638, 20.3247586155), (-37.2068059127, 23.2173632758), (-36.6160682097, 26.519571962))
            ThreePointArc((-36.6160682097, 26.519571962), (-36.9958330654, 29.1823335274), (-38.104844935, 31.6327647492))
            Line((-38.104844935, 31.6327647492), (-40.6031047869, 29.6265739136))
        make_face()
        with BuildLine():
            ThreePointArc((-51.6956428568, 23.4423653569), (-52.4685502322, 27.0538670627), (-51.100991484, 30.484626957))
            Line((-51.100991484, 30.484626957), (-53.7238418013, 32.2838732777))
            ThreePointArc((-53.7238418013, 32.2838732777), (-55.608597509, 27.5643274198), (-54.7982782434, 22.5473761672))
            Line((-54.7982782434, 22.5473761672), (-51.6956428568, 23.4423653569))
        make_face()
        with BuildLine():
            Line((-38.9057442638, 20.3247586155), (-41.2321439004, 22.4915498512))
            ThreePointArc((-41.2321439004, 22.4915498512), (-46.7157234291, 20.1956276723), (-51.6956428568, 23.4423653569))
            Line((-51.6956428568, 23.4423653569), (-54.7982782434, 22.5473761672))
            ThreePointArc((-54.7982782434, 22.5473761672), (-47.460328308, 17.086376438), (-38.9057442638, 20.3247586155))
        make_face()
        with BuildLine():
            ThreePointArc((-41.2321439004, 22.4915498512), (-40.1621816343, 24.3805499149), (-39.7910682097, 26.519571962))
            ThreePointArc((-39.7910682097, 26.519571962), (-39.9974305359, 28.1252544127), (-40.6031047869, 29.6265739136))
            ThreePointArc((-40.6031047869, 29.6265739136), (-45.623771042, 32.8484663078), (-51.100991484, 30.484626957))
            ThreePointArc((-51.100991484, 30.484626957), (-52.4685502322, 27.0538670627), (-51.6956428568, 23.4423653569))
            ThreePointArc((-51.6956428568, 23.4423653569), (-46.7157234291, 20.1956276723), (-41.2321439004, 22.4915498512))
        make_face()
        with Locations((-46.1410682097, 26.519571962)):
            Circle(F0_R, mode=Mode.SUBTRACT)
    extrude(amount=-F2_DEPTH)


solid = Compound([f1.part, f1b.part, f1c.part, f2.part])
